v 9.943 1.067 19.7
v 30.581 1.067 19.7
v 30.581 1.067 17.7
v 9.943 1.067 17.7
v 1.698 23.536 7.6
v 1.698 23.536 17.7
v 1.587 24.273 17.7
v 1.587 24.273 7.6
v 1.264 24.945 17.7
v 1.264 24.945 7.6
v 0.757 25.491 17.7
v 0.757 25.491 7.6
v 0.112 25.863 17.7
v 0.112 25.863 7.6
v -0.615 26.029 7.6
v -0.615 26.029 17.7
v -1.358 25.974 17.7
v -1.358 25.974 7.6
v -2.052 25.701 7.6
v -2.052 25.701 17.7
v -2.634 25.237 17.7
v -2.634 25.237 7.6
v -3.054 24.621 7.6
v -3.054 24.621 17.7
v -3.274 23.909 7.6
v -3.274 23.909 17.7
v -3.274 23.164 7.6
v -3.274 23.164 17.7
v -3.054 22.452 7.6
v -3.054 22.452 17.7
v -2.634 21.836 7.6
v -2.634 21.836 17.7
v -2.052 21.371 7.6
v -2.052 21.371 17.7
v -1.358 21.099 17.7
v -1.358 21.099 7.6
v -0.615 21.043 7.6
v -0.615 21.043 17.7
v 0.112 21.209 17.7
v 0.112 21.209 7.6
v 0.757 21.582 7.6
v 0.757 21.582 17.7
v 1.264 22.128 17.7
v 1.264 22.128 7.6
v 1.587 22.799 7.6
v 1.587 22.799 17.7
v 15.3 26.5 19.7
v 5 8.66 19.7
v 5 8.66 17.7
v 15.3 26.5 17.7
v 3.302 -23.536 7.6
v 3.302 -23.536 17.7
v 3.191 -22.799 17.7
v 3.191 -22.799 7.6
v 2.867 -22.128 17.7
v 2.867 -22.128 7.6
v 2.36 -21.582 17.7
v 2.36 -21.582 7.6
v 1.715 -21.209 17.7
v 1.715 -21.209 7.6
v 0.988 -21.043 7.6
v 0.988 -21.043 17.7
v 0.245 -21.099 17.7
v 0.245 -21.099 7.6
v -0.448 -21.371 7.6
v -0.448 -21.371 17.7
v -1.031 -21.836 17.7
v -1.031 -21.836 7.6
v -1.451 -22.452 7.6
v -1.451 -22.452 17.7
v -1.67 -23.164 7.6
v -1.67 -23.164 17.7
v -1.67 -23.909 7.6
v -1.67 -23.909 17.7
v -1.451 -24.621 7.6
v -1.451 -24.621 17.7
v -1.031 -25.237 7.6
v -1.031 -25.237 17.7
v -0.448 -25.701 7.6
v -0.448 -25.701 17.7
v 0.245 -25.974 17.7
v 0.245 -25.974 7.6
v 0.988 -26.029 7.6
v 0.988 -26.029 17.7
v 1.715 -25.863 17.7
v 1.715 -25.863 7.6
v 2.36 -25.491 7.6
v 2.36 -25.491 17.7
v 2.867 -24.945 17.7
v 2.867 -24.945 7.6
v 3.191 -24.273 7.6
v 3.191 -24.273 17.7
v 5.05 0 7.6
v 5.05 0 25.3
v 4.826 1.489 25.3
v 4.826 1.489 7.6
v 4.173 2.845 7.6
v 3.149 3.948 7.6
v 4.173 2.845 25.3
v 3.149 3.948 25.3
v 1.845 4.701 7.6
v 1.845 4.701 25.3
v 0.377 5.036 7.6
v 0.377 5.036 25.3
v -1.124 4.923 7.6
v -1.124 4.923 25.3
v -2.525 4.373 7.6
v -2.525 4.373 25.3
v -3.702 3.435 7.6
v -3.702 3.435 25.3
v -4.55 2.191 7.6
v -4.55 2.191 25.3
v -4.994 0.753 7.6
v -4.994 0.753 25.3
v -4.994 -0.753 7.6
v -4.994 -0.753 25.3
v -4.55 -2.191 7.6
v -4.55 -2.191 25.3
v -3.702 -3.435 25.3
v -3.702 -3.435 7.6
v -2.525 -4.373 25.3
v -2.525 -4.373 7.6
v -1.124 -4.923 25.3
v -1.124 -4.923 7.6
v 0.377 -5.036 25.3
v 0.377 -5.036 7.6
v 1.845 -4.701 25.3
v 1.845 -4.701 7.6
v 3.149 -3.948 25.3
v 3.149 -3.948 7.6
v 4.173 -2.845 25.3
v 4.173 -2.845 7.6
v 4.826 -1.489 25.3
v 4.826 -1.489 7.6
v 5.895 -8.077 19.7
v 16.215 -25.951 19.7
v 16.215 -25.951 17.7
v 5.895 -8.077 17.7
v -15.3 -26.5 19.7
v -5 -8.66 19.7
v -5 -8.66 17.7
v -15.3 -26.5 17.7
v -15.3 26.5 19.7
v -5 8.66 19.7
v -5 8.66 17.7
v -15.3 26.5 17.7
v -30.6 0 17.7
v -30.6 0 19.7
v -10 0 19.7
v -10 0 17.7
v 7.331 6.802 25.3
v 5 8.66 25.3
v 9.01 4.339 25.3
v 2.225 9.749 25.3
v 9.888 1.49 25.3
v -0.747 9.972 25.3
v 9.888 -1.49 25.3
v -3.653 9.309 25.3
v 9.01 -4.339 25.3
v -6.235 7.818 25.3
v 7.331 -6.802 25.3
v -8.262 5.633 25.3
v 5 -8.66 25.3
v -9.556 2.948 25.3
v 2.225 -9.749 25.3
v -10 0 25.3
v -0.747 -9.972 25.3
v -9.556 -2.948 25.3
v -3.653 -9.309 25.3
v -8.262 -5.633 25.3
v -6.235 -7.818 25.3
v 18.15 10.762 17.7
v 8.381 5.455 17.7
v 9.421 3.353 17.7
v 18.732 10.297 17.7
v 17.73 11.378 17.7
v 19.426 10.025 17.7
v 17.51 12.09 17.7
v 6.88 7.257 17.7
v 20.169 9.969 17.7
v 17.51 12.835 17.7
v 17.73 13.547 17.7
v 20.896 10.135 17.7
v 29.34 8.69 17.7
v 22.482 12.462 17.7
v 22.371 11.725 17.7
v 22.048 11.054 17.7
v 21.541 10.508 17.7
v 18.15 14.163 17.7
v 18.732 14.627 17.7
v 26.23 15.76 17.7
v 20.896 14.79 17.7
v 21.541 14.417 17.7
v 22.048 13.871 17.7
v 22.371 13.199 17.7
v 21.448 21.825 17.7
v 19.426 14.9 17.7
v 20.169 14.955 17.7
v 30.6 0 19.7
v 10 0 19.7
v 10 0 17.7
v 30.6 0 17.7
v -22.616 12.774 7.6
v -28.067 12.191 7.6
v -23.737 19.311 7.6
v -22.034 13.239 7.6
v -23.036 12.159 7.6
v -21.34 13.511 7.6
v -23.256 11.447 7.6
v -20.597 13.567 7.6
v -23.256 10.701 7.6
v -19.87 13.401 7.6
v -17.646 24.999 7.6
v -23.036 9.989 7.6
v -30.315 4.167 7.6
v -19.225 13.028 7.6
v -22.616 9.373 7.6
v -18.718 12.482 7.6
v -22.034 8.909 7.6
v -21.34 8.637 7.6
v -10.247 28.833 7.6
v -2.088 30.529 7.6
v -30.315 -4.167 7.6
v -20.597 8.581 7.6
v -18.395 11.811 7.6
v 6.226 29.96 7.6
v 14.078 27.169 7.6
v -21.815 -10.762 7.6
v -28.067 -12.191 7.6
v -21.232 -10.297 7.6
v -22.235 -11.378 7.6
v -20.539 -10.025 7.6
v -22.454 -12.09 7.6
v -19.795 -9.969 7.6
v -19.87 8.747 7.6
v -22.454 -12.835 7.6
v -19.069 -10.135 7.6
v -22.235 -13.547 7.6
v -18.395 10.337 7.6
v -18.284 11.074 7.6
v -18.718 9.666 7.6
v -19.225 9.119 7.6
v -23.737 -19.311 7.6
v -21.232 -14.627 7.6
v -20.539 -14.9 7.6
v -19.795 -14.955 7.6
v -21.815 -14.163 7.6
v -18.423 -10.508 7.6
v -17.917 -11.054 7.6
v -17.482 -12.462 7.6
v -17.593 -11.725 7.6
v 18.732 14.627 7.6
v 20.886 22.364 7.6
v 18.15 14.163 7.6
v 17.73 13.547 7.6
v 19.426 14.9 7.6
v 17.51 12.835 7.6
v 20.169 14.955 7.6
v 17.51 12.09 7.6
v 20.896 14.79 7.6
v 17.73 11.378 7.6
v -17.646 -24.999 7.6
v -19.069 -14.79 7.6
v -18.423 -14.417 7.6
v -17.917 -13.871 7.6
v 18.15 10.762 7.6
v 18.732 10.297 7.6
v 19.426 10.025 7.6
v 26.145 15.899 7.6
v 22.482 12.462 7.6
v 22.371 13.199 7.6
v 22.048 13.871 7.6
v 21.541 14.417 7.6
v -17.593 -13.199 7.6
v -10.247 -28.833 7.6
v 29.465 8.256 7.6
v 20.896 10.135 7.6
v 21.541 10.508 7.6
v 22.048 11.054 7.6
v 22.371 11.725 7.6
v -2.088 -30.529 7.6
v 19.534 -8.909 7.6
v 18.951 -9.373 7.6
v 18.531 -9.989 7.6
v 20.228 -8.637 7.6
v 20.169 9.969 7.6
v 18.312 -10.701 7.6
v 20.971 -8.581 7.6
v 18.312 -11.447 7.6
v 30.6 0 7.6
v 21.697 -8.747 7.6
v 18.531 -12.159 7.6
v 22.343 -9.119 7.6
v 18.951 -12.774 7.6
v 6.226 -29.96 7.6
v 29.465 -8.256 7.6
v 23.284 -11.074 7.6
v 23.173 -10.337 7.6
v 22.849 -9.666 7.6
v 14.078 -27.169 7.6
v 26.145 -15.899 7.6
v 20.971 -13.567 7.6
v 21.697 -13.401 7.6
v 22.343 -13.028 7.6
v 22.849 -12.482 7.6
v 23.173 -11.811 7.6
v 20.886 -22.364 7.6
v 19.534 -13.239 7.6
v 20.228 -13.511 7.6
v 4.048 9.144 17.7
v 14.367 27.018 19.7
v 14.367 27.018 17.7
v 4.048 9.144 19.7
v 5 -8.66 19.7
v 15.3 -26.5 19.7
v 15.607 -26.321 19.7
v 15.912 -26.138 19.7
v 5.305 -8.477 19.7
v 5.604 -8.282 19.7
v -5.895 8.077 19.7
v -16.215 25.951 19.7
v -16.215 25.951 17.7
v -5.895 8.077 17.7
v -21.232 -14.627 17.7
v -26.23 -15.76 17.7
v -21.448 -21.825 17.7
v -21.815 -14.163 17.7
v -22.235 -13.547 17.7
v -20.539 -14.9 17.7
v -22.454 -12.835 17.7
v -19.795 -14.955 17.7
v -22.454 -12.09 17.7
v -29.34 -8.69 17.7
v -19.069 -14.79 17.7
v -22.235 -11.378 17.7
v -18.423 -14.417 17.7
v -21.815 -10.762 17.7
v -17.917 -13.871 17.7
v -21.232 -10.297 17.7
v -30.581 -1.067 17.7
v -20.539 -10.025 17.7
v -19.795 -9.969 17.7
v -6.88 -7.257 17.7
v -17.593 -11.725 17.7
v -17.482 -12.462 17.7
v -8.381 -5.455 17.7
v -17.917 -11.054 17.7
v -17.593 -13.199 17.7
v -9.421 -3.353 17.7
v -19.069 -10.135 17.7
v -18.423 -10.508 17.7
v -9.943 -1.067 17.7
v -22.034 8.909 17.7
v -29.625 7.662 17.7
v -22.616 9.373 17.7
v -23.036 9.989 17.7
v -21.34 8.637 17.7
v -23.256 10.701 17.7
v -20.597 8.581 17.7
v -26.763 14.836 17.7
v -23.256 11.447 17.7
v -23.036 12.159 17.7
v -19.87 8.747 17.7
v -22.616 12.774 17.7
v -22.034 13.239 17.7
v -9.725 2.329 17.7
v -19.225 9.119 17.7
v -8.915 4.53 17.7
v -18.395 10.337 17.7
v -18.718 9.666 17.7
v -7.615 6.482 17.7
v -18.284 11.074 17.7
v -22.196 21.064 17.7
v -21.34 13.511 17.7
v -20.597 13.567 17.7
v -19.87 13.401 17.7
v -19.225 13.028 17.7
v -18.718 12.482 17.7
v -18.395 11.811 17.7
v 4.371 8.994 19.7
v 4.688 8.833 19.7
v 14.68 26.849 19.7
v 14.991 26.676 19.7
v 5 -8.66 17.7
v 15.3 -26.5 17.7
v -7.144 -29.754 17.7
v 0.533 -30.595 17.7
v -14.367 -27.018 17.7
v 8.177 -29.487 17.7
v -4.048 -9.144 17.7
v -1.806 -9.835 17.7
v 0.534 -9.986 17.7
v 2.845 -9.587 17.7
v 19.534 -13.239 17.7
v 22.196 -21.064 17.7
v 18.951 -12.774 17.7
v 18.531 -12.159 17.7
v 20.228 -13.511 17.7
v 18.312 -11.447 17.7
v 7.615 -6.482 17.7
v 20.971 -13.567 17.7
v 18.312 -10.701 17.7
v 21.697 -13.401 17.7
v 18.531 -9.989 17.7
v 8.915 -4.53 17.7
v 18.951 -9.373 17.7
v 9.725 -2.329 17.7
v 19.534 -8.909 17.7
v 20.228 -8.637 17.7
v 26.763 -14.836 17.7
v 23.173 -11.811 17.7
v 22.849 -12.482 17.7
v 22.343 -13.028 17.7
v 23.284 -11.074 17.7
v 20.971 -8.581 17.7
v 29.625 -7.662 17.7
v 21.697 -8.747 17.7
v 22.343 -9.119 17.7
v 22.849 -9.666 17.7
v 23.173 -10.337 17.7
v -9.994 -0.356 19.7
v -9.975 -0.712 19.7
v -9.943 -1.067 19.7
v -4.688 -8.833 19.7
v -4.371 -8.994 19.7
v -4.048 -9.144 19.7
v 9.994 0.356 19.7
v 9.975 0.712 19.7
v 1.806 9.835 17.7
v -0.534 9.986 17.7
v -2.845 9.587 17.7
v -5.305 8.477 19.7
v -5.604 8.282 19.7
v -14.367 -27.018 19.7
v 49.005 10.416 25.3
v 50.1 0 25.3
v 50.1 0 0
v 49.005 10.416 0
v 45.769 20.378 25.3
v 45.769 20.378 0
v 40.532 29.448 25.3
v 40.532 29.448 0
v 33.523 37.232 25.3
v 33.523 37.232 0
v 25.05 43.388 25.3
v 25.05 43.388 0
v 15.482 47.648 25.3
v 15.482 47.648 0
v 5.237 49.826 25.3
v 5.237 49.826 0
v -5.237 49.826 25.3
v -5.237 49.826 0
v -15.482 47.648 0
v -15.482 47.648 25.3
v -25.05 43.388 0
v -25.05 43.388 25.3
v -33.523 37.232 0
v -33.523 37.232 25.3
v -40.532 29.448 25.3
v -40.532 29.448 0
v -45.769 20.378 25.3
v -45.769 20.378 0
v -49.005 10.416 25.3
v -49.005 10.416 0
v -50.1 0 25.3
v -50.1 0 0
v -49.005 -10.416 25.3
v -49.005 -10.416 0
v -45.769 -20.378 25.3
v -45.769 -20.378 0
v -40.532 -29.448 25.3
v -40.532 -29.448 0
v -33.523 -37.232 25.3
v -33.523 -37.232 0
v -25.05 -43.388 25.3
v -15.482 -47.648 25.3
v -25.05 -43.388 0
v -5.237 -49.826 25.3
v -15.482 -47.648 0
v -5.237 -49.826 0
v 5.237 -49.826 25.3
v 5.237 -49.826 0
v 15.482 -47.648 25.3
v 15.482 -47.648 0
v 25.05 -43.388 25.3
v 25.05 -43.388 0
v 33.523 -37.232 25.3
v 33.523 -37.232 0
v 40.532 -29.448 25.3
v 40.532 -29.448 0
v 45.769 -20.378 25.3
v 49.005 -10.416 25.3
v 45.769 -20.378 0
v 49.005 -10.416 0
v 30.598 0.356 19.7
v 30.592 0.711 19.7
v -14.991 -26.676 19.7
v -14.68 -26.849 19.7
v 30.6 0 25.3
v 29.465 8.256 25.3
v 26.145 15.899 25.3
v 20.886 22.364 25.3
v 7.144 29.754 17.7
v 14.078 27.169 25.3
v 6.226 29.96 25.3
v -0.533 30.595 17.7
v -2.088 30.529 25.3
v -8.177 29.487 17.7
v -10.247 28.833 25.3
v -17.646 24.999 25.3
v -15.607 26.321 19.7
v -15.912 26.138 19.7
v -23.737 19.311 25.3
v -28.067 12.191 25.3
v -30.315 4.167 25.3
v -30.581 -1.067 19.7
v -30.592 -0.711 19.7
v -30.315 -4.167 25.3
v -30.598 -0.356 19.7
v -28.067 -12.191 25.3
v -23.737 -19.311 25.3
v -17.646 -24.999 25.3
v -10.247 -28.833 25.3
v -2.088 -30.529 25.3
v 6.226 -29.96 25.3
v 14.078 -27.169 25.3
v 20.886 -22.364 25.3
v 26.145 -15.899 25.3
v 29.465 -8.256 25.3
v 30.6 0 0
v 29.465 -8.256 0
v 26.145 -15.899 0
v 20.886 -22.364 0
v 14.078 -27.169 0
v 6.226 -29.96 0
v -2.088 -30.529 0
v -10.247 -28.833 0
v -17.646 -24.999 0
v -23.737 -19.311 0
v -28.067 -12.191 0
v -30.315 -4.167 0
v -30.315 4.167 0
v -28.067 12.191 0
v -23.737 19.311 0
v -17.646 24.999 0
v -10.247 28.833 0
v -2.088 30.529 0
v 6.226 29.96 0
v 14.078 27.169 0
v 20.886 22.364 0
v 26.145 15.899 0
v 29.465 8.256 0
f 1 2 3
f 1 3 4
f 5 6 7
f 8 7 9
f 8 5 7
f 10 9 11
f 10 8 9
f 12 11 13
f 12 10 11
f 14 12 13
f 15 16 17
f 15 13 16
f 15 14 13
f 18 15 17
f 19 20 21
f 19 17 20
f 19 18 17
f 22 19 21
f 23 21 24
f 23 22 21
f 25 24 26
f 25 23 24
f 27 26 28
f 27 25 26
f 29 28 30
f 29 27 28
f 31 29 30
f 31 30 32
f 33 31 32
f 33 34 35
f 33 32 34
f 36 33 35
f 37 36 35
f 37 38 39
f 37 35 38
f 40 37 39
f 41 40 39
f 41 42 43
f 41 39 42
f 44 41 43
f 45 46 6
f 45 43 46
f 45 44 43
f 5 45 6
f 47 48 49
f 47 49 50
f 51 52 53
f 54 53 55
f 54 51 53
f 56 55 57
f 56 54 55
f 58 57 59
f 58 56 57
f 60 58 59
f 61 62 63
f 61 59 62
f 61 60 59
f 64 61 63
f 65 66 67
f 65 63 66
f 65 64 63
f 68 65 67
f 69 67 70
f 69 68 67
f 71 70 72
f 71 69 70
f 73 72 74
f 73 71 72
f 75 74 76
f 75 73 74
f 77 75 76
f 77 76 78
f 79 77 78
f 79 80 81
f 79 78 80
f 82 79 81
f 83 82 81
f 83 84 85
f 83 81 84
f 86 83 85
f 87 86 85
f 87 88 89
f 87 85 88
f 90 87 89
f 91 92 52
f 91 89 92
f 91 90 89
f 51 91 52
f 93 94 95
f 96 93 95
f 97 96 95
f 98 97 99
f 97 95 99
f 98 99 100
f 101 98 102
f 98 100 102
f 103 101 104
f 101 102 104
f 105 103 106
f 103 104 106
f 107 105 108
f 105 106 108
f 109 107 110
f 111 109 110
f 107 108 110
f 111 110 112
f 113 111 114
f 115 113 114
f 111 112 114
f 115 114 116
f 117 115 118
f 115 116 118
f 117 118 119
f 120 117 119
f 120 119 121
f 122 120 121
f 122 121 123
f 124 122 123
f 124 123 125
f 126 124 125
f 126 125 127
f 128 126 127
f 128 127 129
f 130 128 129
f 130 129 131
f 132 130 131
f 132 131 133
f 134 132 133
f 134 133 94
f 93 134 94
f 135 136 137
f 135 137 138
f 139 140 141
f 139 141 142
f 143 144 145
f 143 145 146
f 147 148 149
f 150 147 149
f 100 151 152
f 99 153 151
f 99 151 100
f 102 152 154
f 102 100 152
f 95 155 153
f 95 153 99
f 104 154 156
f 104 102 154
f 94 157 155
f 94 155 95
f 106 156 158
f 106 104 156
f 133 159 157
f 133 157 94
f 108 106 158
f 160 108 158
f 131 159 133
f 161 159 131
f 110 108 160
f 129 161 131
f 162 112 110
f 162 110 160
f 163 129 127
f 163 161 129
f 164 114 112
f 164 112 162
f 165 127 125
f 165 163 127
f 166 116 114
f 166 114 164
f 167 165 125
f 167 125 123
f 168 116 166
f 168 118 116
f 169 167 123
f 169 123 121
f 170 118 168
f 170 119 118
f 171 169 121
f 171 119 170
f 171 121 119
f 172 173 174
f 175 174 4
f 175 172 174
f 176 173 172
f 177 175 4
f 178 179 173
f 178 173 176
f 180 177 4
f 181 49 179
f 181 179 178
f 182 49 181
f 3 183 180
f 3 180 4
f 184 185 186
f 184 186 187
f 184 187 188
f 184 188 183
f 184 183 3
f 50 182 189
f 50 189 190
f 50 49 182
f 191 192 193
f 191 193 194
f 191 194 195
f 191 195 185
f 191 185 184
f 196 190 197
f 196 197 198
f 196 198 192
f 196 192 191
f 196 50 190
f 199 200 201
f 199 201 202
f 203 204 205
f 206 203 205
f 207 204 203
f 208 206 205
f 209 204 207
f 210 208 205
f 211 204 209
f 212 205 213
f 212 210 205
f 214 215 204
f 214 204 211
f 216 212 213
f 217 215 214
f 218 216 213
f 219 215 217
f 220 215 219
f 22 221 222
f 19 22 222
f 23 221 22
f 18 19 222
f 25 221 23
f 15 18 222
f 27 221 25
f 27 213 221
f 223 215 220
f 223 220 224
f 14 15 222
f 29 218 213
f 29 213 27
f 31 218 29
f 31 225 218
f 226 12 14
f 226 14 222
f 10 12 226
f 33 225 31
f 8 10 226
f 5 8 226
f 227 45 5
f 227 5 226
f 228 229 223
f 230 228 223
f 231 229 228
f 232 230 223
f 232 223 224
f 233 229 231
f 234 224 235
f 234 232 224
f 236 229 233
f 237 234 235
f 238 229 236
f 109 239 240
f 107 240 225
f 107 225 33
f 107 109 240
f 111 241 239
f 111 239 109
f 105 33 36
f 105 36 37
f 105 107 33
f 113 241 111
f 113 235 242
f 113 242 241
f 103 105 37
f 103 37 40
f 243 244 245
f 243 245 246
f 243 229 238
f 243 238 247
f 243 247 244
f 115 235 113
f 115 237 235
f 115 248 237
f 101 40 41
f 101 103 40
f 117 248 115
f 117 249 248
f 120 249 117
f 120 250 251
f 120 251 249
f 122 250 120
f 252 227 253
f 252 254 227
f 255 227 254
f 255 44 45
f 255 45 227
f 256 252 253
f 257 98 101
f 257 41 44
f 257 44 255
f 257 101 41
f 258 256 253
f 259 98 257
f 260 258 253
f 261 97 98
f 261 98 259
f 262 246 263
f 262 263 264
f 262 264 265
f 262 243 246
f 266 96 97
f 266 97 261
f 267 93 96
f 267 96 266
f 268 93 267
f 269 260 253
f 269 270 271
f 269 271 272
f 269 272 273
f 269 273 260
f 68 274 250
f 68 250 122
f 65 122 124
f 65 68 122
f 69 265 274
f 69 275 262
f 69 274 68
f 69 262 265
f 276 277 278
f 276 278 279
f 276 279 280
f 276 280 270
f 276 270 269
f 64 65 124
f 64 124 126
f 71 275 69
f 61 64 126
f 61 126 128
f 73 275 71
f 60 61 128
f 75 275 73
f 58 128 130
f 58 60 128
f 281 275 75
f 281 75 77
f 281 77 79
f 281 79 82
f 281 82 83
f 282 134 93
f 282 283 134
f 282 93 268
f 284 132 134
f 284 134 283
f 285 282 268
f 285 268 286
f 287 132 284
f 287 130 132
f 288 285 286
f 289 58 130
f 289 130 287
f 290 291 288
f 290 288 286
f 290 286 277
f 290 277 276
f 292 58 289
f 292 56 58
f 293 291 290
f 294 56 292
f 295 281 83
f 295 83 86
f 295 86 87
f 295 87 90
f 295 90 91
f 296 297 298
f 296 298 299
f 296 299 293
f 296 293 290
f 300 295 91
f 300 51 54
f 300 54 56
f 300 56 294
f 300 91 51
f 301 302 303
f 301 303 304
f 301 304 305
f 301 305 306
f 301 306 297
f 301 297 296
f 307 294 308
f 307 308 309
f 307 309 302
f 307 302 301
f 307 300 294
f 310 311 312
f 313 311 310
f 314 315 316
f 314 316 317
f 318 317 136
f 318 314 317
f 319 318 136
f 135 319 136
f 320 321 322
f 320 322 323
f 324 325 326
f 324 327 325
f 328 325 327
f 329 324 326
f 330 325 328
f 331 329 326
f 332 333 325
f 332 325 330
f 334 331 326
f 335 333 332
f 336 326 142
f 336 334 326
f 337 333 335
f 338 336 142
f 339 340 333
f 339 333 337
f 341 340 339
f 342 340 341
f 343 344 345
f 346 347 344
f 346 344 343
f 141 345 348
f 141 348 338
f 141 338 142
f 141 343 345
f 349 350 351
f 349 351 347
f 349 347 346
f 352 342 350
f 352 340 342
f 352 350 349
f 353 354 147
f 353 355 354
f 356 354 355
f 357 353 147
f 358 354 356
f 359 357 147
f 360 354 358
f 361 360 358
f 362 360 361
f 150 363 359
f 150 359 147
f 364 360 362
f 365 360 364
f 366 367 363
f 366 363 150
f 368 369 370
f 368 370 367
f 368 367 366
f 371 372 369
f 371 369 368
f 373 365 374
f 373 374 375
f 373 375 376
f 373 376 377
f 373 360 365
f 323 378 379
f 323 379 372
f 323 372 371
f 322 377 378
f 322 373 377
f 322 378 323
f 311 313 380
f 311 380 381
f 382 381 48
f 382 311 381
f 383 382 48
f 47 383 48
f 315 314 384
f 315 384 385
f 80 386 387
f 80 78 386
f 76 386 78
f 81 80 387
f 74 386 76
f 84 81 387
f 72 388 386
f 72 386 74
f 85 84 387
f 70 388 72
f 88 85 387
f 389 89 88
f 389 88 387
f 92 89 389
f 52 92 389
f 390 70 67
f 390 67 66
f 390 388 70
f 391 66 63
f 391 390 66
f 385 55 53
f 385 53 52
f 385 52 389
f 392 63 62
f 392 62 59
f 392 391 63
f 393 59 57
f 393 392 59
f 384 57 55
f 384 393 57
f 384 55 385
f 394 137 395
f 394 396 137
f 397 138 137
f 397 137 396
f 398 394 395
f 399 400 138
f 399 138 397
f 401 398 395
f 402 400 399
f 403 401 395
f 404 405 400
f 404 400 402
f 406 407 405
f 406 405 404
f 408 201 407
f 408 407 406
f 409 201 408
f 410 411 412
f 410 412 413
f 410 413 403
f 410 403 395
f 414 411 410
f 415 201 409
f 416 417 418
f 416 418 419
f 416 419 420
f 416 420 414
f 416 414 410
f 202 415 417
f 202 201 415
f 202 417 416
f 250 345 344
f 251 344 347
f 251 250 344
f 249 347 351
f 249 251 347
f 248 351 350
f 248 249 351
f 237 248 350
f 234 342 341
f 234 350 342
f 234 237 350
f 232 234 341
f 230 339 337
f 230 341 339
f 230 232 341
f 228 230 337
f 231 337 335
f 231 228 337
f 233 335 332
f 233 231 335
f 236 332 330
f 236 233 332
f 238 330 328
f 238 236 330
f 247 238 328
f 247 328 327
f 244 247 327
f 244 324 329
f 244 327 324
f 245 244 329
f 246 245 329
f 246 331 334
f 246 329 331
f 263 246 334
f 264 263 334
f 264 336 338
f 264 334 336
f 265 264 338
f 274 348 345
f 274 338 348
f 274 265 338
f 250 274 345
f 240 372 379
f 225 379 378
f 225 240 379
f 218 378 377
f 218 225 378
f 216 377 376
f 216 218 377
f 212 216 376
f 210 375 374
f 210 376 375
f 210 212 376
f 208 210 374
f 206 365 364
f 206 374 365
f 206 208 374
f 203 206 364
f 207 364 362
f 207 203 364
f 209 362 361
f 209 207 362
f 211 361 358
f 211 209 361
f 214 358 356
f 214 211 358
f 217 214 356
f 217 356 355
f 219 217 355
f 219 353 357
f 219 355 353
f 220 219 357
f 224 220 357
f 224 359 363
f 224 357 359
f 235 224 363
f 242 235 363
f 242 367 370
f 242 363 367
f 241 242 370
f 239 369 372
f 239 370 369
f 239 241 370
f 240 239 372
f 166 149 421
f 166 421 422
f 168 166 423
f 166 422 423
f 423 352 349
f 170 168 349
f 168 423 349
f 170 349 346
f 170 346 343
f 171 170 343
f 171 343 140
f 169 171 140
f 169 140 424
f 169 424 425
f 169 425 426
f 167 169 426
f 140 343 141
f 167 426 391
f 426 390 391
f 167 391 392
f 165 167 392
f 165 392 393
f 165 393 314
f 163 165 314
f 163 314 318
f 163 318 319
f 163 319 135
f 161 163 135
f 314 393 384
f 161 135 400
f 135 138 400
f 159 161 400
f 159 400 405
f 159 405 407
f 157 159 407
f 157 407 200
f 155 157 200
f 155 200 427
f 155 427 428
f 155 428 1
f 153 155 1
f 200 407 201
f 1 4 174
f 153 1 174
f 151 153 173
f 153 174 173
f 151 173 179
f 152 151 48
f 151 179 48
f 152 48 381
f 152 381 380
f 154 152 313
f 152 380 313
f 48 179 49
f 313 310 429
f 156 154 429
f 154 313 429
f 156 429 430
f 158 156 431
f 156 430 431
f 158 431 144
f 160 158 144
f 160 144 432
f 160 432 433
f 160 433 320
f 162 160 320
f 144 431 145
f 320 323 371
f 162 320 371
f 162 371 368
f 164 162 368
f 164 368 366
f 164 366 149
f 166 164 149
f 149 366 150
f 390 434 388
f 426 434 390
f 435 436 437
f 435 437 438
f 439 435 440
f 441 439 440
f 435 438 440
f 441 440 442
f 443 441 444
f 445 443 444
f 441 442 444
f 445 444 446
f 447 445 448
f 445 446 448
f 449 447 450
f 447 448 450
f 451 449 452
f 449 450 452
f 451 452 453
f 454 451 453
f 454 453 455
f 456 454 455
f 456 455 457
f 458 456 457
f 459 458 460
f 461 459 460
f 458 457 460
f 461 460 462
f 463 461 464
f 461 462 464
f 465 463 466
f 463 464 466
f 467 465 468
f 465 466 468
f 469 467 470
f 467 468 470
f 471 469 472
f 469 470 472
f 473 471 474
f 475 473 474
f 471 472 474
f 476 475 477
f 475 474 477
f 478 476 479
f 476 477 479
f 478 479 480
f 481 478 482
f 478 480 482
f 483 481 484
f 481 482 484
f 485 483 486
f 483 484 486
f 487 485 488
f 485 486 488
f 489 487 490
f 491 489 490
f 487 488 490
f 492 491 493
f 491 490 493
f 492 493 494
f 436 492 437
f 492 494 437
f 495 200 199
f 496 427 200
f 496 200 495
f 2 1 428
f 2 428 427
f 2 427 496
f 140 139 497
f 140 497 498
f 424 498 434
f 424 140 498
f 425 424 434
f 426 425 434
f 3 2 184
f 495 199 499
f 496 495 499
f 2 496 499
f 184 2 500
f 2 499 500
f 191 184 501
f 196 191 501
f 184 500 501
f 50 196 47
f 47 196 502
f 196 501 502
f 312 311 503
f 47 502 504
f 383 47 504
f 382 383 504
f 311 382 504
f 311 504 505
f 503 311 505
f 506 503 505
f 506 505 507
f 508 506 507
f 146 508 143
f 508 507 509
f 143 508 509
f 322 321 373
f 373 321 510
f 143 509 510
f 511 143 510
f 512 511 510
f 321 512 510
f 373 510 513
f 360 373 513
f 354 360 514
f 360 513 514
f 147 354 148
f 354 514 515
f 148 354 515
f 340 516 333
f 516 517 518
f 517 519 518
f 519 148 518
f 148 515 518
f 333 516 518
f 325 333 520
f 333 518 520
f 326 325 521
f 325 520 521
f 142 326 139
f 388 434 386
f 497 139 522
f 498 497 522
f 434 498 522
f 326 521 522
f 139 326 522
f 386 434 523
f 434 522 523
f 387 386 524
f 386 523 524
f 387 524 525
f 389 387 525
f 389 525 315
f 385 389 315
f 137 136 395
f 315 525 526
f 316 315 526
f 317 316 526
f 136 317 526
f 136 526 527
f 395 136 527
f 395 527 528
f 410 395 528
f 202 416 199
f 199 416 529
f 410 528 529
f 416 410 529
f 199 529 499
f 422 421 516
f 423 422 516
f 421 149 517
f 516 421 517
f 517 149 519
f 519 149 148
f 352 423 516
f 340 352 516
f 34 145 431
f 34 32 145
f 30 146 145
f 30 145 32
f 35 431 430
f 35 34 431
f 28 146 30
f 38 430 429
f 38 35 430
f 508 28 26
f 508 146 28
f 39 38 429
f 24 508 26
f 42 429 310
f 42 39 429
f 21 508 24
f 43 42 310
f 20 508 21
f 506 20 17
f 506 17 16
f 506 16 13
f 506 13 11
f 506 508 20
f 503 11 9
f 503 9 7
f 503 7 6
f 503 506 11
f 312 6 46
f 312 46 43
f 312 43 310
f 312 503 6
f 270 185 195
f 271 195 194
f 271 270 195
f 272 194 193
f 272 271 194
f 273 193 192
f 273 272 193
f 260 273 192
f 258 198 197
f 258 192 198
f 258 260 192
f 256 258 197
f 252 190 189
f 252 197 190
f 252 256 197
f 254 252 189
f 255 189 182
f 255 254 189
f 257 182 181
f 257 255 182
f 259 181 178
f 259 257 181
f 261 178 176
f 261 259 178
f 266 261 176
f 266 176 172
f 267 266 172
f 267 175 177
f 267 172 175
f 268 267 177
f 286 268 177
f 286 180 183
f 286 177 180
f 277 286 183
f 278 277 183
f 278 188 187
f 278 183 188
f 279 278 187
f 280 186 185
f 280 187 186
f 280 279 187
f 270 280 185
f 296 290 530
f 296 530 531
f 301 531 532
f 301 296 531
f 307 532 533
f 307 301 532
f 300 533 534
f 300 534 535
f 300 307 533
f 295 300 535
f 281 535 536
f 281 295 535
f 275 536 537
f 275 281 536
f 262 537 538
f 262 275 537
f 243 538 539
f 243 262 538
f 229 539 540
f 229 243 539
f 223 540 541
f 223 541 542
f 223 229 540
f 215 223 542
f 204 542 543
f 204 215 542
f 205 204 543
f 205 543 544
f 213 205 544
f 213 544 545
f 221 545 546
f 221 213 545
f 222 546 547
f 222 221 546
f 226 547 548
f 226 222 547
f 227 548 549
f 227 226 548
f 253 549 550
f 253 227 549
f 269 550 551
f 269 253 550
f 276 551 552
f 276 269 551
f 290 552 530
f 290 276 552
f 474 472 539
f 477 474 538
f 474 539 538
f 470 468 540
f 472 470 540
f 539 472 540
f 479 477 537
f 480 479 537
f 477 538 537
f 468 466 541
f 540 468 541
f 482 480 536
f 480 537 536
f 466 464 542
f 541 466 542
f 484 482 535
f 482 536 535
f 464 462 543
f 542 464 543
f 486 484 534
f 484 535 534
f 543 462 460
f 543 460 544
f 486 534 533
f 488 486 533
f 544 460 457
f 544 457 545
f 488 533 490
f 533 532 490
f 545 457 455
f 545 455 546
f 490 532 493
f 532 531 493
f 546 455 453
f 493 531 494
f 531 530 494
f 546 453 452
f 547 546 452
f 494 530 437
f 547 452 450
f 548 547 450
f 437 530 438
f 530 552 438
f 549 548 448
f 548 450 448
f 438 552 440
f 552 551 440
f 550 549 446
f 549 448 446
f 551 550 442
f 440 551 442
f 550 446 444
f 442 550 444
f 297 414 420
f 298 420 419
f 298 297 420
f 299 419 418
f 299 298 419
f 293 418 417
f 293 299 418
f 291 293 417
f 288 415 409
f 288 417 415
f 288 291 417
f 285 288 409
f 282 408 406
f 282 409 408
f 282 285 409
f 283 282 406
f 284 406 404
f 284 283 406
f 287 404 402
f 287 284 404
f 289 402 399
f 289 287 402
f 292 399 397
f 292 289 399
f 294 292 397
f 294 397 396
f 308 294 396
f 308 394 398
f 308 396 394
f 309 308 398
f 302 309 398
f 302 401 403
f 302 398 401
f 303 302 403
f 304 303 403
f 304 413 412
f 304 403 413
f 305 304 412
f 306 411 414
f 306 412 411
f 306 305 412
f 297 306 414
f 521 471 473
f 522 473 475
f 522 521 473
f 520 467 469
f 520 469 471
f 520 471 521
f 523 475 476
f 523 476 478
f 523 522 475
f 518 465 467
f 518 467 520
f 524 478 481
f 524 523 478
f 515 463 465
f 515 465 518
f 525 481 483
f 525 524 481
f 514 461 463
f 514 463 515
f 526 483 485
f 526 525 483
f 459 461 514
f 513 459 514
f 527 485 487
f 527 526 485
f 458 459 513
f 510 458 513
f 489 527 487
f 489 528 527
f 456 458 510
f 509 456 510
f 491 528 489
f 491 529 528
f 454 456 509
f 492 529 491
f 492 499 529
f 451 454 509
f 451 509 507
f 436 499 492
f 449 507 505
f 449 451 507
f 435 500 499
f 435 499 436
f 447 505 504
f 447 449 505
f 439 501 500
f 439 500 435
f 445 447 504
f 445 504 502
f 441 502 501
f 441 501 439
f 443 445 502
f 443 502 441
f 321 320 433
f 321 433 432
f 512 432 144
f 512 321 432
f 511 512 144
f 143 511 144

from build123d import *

# Parameters (mm, degrees)
SKETCH1_R           = 50.1
BOSS_EXTRUDE5_DEPTH = 25.3
SKETCH4_R           = 30.6
CUT_EXTRUDE1_DEPTH  = 7.6
CUT_EXTRUDE2_START  = -7.6
SKETCH5_R           = 30.6
CUT_EXTRUDE2_DEPTH  = 7.6
SKETCH6_R           = 10
BOSS_EXTRUDE7_DEPTH = 7.6
SKETCH7_R           = 5.05
CUT_EXTRUDE5_DEPTH  = 10000
BOSS_EXTRUDE8_START = 2
BOSS_EXTRUDE8_DEPTH = 2
SKETCH9_R           = 2.5
CUT_EXTRUDE11_DEPTH = 74.029514581


with BuildPart() as part:
    # Sketch1 → Boss-Extrude5 (new body)
    with BuildSketch(Plane.XY):
        Circle(SKETCH1_R)
    extrude(amount=BOSS_EXTRUDE5_DEPTH)

    # Sketch4 → Cut-Extrude1 (cut)
    with BuildSketch(Plane.XY.offset(25.3)):
        Circle(SKETCH4_R)
    extrude(amount=-CUT_EXTRUDE1_DEPTH, mode=Mode.SUBTRACT)

    # Sketch5 → Cut-Extrude2 (cut)
    with BuildSketch(Plane(origin=(0, 0, 0), x_dir=(-1, 0, 0), z_dir=(0, 0, -1)).offset(CUT_EXTRUDE2_START)):
        with Locations(Location((0, 0, 0), (0, 0, 180))):
            Circle(SKETCH5_R)
    extrude(amount=CUT_EXTRUDE2_DEPTH, mode=Mode.SUBTRACT)

    # Sketch6 → Boss-Extrude7 (add)
    with BuildSketch(Plane.XY.offset(17.7)):
        with Locations(Location((0, 0, 0), (0, 0, 180))):
            Circle(SKETCH6_R)
    extrude(amount=BOSS_EXTRUDE7_DEPTH)

    # Sketch7 → Cut-Extrude5 (cut)
    with BuildSketch(Plane.XY.offset(25.3)):
        Circle(SKETCH7_R)
    extrude(amount=-CUT_EXTRUDE5_DEPTH, mode=Mode.SUBTRACT)

    # Sketch8 → Boss-Extrude8 (add)
    with BuildSketch(Plane.XY.offset(17.7).offset(BOSS_EXTRUDE8_START)):
        with BuildLine():
            Line((-30.6, 0), (-10, 0))
            ThreePointArc((-10, 0), (-9.985723513, -0.534159082), (-9.942934815, -1.066792981))
            Line((-9.942934815, -1.066792981), (-30.581398803, -1.066792981))
            ThreePointArc((-30.581398803, -1.066792981), (-30.595349347, -0.53347757), (-30.6, 0))
        make_face()
        with BuildLine():
            Line((-16.214569224, 25.950871756), (-5.89533723, 8.077437647))
            ThreePointArc((-5.89533723, 8.077437647), (-5.455457091, 8.380810696), (-5, 8.660254038))
            Line((-5, 8.660254038), (-15.3, 26.500377356))
            ThreePointArc((-15.3, 26.500377356), (-15.759679801, 26.229610988), (-16.214569224, 25.950871756))
        make_face()
        with BuildLine():
            Line((14.366829579, 27.017664737), (4.047597585, 9.144230629))
            ThreePointArc((4.047597585, 9.144230629), (4.530266422, 8.914969778), (5, 8.660254038))
            Line((5, 8.660254038), (15.3, 26.500377356))
            ThreePointArc((15.3, 26.500377356), (14.835669546, 26.763088557), (14.366829579, 27.017664737))
        make_face()
        with BuildLine():
            Line((30.581398803, 1.066792981), (9.942934815, 1.066792981))
            ThreePointArc((9.942934815, 1.066792981), (9.985723513, 0.534159082), (10, 0))
            Line((10, 0), (30.6, 0))
            ThreePointArc((30.6, 0), (30.595349347, 0.53347757), (30.581398803, 1.066792981))
        make_face()
        with BuildLine():
            Line((16.214569224, -25.950871756), (5.89533723, -8.077437647))
            ThreePointArc((5.89533723, -8.077437647), (5.455457091, -8.380810696), (5, -8.660254038))
            Line((5, -8.660254038), (15.3, -26.500377356))
            ThreePointArc((15.3, -26.500377356), (15.759679801, -26.229610988), (16.214569224, -25.950871756))
        make_face()
        with BuildLine():
            Line((-14.366829579, -27.017664737), (-4.047597585, -9.144230629))
            ThreePointArc((-4.047597585, -9.144230629), (-4.530266422, -8.914969778), (-5, -8.660254038))
            Line((-5, -8.660254038), (-15.3, -26.500377356))
            ThreePointArc((-15.3, -26.500377356), (-14.835669546, -26.763088557), (-14.366829579, -27.017664737))
        make_face()
    extrude(amount=-BOSS_EXTRUDE8_DEPTH)

    # Sketch9 → Cut-Extrude11 (cut, through all)
    with BuildSketch(Plane.XY.offset(7.6)):
        with Locations((-19.982206185, -12.462368817)):
            Circle(SKETCH9_R)
        with Locations((-20.783831079, 11.073913771)):
            Circle(SKETCH9_R)
        with Locations((-0.801624894, 23.536282588)):
            Circle(SKETCH9_R)
        with Locations((19.982206185, 12.462368817)):
            Circle(SKETCH9_R)
        with Locations((20.783831079, -11.073913771)):
            Circle(SKETCH9_R)
        with Locations((0.801624894, -23.536282588)):
            Circle(SKETCH9_R)
    extrude(amount=CUT_EXTRUDE11_DEPTH, mode=Mode.SUBTRACT)


solid = part.part
